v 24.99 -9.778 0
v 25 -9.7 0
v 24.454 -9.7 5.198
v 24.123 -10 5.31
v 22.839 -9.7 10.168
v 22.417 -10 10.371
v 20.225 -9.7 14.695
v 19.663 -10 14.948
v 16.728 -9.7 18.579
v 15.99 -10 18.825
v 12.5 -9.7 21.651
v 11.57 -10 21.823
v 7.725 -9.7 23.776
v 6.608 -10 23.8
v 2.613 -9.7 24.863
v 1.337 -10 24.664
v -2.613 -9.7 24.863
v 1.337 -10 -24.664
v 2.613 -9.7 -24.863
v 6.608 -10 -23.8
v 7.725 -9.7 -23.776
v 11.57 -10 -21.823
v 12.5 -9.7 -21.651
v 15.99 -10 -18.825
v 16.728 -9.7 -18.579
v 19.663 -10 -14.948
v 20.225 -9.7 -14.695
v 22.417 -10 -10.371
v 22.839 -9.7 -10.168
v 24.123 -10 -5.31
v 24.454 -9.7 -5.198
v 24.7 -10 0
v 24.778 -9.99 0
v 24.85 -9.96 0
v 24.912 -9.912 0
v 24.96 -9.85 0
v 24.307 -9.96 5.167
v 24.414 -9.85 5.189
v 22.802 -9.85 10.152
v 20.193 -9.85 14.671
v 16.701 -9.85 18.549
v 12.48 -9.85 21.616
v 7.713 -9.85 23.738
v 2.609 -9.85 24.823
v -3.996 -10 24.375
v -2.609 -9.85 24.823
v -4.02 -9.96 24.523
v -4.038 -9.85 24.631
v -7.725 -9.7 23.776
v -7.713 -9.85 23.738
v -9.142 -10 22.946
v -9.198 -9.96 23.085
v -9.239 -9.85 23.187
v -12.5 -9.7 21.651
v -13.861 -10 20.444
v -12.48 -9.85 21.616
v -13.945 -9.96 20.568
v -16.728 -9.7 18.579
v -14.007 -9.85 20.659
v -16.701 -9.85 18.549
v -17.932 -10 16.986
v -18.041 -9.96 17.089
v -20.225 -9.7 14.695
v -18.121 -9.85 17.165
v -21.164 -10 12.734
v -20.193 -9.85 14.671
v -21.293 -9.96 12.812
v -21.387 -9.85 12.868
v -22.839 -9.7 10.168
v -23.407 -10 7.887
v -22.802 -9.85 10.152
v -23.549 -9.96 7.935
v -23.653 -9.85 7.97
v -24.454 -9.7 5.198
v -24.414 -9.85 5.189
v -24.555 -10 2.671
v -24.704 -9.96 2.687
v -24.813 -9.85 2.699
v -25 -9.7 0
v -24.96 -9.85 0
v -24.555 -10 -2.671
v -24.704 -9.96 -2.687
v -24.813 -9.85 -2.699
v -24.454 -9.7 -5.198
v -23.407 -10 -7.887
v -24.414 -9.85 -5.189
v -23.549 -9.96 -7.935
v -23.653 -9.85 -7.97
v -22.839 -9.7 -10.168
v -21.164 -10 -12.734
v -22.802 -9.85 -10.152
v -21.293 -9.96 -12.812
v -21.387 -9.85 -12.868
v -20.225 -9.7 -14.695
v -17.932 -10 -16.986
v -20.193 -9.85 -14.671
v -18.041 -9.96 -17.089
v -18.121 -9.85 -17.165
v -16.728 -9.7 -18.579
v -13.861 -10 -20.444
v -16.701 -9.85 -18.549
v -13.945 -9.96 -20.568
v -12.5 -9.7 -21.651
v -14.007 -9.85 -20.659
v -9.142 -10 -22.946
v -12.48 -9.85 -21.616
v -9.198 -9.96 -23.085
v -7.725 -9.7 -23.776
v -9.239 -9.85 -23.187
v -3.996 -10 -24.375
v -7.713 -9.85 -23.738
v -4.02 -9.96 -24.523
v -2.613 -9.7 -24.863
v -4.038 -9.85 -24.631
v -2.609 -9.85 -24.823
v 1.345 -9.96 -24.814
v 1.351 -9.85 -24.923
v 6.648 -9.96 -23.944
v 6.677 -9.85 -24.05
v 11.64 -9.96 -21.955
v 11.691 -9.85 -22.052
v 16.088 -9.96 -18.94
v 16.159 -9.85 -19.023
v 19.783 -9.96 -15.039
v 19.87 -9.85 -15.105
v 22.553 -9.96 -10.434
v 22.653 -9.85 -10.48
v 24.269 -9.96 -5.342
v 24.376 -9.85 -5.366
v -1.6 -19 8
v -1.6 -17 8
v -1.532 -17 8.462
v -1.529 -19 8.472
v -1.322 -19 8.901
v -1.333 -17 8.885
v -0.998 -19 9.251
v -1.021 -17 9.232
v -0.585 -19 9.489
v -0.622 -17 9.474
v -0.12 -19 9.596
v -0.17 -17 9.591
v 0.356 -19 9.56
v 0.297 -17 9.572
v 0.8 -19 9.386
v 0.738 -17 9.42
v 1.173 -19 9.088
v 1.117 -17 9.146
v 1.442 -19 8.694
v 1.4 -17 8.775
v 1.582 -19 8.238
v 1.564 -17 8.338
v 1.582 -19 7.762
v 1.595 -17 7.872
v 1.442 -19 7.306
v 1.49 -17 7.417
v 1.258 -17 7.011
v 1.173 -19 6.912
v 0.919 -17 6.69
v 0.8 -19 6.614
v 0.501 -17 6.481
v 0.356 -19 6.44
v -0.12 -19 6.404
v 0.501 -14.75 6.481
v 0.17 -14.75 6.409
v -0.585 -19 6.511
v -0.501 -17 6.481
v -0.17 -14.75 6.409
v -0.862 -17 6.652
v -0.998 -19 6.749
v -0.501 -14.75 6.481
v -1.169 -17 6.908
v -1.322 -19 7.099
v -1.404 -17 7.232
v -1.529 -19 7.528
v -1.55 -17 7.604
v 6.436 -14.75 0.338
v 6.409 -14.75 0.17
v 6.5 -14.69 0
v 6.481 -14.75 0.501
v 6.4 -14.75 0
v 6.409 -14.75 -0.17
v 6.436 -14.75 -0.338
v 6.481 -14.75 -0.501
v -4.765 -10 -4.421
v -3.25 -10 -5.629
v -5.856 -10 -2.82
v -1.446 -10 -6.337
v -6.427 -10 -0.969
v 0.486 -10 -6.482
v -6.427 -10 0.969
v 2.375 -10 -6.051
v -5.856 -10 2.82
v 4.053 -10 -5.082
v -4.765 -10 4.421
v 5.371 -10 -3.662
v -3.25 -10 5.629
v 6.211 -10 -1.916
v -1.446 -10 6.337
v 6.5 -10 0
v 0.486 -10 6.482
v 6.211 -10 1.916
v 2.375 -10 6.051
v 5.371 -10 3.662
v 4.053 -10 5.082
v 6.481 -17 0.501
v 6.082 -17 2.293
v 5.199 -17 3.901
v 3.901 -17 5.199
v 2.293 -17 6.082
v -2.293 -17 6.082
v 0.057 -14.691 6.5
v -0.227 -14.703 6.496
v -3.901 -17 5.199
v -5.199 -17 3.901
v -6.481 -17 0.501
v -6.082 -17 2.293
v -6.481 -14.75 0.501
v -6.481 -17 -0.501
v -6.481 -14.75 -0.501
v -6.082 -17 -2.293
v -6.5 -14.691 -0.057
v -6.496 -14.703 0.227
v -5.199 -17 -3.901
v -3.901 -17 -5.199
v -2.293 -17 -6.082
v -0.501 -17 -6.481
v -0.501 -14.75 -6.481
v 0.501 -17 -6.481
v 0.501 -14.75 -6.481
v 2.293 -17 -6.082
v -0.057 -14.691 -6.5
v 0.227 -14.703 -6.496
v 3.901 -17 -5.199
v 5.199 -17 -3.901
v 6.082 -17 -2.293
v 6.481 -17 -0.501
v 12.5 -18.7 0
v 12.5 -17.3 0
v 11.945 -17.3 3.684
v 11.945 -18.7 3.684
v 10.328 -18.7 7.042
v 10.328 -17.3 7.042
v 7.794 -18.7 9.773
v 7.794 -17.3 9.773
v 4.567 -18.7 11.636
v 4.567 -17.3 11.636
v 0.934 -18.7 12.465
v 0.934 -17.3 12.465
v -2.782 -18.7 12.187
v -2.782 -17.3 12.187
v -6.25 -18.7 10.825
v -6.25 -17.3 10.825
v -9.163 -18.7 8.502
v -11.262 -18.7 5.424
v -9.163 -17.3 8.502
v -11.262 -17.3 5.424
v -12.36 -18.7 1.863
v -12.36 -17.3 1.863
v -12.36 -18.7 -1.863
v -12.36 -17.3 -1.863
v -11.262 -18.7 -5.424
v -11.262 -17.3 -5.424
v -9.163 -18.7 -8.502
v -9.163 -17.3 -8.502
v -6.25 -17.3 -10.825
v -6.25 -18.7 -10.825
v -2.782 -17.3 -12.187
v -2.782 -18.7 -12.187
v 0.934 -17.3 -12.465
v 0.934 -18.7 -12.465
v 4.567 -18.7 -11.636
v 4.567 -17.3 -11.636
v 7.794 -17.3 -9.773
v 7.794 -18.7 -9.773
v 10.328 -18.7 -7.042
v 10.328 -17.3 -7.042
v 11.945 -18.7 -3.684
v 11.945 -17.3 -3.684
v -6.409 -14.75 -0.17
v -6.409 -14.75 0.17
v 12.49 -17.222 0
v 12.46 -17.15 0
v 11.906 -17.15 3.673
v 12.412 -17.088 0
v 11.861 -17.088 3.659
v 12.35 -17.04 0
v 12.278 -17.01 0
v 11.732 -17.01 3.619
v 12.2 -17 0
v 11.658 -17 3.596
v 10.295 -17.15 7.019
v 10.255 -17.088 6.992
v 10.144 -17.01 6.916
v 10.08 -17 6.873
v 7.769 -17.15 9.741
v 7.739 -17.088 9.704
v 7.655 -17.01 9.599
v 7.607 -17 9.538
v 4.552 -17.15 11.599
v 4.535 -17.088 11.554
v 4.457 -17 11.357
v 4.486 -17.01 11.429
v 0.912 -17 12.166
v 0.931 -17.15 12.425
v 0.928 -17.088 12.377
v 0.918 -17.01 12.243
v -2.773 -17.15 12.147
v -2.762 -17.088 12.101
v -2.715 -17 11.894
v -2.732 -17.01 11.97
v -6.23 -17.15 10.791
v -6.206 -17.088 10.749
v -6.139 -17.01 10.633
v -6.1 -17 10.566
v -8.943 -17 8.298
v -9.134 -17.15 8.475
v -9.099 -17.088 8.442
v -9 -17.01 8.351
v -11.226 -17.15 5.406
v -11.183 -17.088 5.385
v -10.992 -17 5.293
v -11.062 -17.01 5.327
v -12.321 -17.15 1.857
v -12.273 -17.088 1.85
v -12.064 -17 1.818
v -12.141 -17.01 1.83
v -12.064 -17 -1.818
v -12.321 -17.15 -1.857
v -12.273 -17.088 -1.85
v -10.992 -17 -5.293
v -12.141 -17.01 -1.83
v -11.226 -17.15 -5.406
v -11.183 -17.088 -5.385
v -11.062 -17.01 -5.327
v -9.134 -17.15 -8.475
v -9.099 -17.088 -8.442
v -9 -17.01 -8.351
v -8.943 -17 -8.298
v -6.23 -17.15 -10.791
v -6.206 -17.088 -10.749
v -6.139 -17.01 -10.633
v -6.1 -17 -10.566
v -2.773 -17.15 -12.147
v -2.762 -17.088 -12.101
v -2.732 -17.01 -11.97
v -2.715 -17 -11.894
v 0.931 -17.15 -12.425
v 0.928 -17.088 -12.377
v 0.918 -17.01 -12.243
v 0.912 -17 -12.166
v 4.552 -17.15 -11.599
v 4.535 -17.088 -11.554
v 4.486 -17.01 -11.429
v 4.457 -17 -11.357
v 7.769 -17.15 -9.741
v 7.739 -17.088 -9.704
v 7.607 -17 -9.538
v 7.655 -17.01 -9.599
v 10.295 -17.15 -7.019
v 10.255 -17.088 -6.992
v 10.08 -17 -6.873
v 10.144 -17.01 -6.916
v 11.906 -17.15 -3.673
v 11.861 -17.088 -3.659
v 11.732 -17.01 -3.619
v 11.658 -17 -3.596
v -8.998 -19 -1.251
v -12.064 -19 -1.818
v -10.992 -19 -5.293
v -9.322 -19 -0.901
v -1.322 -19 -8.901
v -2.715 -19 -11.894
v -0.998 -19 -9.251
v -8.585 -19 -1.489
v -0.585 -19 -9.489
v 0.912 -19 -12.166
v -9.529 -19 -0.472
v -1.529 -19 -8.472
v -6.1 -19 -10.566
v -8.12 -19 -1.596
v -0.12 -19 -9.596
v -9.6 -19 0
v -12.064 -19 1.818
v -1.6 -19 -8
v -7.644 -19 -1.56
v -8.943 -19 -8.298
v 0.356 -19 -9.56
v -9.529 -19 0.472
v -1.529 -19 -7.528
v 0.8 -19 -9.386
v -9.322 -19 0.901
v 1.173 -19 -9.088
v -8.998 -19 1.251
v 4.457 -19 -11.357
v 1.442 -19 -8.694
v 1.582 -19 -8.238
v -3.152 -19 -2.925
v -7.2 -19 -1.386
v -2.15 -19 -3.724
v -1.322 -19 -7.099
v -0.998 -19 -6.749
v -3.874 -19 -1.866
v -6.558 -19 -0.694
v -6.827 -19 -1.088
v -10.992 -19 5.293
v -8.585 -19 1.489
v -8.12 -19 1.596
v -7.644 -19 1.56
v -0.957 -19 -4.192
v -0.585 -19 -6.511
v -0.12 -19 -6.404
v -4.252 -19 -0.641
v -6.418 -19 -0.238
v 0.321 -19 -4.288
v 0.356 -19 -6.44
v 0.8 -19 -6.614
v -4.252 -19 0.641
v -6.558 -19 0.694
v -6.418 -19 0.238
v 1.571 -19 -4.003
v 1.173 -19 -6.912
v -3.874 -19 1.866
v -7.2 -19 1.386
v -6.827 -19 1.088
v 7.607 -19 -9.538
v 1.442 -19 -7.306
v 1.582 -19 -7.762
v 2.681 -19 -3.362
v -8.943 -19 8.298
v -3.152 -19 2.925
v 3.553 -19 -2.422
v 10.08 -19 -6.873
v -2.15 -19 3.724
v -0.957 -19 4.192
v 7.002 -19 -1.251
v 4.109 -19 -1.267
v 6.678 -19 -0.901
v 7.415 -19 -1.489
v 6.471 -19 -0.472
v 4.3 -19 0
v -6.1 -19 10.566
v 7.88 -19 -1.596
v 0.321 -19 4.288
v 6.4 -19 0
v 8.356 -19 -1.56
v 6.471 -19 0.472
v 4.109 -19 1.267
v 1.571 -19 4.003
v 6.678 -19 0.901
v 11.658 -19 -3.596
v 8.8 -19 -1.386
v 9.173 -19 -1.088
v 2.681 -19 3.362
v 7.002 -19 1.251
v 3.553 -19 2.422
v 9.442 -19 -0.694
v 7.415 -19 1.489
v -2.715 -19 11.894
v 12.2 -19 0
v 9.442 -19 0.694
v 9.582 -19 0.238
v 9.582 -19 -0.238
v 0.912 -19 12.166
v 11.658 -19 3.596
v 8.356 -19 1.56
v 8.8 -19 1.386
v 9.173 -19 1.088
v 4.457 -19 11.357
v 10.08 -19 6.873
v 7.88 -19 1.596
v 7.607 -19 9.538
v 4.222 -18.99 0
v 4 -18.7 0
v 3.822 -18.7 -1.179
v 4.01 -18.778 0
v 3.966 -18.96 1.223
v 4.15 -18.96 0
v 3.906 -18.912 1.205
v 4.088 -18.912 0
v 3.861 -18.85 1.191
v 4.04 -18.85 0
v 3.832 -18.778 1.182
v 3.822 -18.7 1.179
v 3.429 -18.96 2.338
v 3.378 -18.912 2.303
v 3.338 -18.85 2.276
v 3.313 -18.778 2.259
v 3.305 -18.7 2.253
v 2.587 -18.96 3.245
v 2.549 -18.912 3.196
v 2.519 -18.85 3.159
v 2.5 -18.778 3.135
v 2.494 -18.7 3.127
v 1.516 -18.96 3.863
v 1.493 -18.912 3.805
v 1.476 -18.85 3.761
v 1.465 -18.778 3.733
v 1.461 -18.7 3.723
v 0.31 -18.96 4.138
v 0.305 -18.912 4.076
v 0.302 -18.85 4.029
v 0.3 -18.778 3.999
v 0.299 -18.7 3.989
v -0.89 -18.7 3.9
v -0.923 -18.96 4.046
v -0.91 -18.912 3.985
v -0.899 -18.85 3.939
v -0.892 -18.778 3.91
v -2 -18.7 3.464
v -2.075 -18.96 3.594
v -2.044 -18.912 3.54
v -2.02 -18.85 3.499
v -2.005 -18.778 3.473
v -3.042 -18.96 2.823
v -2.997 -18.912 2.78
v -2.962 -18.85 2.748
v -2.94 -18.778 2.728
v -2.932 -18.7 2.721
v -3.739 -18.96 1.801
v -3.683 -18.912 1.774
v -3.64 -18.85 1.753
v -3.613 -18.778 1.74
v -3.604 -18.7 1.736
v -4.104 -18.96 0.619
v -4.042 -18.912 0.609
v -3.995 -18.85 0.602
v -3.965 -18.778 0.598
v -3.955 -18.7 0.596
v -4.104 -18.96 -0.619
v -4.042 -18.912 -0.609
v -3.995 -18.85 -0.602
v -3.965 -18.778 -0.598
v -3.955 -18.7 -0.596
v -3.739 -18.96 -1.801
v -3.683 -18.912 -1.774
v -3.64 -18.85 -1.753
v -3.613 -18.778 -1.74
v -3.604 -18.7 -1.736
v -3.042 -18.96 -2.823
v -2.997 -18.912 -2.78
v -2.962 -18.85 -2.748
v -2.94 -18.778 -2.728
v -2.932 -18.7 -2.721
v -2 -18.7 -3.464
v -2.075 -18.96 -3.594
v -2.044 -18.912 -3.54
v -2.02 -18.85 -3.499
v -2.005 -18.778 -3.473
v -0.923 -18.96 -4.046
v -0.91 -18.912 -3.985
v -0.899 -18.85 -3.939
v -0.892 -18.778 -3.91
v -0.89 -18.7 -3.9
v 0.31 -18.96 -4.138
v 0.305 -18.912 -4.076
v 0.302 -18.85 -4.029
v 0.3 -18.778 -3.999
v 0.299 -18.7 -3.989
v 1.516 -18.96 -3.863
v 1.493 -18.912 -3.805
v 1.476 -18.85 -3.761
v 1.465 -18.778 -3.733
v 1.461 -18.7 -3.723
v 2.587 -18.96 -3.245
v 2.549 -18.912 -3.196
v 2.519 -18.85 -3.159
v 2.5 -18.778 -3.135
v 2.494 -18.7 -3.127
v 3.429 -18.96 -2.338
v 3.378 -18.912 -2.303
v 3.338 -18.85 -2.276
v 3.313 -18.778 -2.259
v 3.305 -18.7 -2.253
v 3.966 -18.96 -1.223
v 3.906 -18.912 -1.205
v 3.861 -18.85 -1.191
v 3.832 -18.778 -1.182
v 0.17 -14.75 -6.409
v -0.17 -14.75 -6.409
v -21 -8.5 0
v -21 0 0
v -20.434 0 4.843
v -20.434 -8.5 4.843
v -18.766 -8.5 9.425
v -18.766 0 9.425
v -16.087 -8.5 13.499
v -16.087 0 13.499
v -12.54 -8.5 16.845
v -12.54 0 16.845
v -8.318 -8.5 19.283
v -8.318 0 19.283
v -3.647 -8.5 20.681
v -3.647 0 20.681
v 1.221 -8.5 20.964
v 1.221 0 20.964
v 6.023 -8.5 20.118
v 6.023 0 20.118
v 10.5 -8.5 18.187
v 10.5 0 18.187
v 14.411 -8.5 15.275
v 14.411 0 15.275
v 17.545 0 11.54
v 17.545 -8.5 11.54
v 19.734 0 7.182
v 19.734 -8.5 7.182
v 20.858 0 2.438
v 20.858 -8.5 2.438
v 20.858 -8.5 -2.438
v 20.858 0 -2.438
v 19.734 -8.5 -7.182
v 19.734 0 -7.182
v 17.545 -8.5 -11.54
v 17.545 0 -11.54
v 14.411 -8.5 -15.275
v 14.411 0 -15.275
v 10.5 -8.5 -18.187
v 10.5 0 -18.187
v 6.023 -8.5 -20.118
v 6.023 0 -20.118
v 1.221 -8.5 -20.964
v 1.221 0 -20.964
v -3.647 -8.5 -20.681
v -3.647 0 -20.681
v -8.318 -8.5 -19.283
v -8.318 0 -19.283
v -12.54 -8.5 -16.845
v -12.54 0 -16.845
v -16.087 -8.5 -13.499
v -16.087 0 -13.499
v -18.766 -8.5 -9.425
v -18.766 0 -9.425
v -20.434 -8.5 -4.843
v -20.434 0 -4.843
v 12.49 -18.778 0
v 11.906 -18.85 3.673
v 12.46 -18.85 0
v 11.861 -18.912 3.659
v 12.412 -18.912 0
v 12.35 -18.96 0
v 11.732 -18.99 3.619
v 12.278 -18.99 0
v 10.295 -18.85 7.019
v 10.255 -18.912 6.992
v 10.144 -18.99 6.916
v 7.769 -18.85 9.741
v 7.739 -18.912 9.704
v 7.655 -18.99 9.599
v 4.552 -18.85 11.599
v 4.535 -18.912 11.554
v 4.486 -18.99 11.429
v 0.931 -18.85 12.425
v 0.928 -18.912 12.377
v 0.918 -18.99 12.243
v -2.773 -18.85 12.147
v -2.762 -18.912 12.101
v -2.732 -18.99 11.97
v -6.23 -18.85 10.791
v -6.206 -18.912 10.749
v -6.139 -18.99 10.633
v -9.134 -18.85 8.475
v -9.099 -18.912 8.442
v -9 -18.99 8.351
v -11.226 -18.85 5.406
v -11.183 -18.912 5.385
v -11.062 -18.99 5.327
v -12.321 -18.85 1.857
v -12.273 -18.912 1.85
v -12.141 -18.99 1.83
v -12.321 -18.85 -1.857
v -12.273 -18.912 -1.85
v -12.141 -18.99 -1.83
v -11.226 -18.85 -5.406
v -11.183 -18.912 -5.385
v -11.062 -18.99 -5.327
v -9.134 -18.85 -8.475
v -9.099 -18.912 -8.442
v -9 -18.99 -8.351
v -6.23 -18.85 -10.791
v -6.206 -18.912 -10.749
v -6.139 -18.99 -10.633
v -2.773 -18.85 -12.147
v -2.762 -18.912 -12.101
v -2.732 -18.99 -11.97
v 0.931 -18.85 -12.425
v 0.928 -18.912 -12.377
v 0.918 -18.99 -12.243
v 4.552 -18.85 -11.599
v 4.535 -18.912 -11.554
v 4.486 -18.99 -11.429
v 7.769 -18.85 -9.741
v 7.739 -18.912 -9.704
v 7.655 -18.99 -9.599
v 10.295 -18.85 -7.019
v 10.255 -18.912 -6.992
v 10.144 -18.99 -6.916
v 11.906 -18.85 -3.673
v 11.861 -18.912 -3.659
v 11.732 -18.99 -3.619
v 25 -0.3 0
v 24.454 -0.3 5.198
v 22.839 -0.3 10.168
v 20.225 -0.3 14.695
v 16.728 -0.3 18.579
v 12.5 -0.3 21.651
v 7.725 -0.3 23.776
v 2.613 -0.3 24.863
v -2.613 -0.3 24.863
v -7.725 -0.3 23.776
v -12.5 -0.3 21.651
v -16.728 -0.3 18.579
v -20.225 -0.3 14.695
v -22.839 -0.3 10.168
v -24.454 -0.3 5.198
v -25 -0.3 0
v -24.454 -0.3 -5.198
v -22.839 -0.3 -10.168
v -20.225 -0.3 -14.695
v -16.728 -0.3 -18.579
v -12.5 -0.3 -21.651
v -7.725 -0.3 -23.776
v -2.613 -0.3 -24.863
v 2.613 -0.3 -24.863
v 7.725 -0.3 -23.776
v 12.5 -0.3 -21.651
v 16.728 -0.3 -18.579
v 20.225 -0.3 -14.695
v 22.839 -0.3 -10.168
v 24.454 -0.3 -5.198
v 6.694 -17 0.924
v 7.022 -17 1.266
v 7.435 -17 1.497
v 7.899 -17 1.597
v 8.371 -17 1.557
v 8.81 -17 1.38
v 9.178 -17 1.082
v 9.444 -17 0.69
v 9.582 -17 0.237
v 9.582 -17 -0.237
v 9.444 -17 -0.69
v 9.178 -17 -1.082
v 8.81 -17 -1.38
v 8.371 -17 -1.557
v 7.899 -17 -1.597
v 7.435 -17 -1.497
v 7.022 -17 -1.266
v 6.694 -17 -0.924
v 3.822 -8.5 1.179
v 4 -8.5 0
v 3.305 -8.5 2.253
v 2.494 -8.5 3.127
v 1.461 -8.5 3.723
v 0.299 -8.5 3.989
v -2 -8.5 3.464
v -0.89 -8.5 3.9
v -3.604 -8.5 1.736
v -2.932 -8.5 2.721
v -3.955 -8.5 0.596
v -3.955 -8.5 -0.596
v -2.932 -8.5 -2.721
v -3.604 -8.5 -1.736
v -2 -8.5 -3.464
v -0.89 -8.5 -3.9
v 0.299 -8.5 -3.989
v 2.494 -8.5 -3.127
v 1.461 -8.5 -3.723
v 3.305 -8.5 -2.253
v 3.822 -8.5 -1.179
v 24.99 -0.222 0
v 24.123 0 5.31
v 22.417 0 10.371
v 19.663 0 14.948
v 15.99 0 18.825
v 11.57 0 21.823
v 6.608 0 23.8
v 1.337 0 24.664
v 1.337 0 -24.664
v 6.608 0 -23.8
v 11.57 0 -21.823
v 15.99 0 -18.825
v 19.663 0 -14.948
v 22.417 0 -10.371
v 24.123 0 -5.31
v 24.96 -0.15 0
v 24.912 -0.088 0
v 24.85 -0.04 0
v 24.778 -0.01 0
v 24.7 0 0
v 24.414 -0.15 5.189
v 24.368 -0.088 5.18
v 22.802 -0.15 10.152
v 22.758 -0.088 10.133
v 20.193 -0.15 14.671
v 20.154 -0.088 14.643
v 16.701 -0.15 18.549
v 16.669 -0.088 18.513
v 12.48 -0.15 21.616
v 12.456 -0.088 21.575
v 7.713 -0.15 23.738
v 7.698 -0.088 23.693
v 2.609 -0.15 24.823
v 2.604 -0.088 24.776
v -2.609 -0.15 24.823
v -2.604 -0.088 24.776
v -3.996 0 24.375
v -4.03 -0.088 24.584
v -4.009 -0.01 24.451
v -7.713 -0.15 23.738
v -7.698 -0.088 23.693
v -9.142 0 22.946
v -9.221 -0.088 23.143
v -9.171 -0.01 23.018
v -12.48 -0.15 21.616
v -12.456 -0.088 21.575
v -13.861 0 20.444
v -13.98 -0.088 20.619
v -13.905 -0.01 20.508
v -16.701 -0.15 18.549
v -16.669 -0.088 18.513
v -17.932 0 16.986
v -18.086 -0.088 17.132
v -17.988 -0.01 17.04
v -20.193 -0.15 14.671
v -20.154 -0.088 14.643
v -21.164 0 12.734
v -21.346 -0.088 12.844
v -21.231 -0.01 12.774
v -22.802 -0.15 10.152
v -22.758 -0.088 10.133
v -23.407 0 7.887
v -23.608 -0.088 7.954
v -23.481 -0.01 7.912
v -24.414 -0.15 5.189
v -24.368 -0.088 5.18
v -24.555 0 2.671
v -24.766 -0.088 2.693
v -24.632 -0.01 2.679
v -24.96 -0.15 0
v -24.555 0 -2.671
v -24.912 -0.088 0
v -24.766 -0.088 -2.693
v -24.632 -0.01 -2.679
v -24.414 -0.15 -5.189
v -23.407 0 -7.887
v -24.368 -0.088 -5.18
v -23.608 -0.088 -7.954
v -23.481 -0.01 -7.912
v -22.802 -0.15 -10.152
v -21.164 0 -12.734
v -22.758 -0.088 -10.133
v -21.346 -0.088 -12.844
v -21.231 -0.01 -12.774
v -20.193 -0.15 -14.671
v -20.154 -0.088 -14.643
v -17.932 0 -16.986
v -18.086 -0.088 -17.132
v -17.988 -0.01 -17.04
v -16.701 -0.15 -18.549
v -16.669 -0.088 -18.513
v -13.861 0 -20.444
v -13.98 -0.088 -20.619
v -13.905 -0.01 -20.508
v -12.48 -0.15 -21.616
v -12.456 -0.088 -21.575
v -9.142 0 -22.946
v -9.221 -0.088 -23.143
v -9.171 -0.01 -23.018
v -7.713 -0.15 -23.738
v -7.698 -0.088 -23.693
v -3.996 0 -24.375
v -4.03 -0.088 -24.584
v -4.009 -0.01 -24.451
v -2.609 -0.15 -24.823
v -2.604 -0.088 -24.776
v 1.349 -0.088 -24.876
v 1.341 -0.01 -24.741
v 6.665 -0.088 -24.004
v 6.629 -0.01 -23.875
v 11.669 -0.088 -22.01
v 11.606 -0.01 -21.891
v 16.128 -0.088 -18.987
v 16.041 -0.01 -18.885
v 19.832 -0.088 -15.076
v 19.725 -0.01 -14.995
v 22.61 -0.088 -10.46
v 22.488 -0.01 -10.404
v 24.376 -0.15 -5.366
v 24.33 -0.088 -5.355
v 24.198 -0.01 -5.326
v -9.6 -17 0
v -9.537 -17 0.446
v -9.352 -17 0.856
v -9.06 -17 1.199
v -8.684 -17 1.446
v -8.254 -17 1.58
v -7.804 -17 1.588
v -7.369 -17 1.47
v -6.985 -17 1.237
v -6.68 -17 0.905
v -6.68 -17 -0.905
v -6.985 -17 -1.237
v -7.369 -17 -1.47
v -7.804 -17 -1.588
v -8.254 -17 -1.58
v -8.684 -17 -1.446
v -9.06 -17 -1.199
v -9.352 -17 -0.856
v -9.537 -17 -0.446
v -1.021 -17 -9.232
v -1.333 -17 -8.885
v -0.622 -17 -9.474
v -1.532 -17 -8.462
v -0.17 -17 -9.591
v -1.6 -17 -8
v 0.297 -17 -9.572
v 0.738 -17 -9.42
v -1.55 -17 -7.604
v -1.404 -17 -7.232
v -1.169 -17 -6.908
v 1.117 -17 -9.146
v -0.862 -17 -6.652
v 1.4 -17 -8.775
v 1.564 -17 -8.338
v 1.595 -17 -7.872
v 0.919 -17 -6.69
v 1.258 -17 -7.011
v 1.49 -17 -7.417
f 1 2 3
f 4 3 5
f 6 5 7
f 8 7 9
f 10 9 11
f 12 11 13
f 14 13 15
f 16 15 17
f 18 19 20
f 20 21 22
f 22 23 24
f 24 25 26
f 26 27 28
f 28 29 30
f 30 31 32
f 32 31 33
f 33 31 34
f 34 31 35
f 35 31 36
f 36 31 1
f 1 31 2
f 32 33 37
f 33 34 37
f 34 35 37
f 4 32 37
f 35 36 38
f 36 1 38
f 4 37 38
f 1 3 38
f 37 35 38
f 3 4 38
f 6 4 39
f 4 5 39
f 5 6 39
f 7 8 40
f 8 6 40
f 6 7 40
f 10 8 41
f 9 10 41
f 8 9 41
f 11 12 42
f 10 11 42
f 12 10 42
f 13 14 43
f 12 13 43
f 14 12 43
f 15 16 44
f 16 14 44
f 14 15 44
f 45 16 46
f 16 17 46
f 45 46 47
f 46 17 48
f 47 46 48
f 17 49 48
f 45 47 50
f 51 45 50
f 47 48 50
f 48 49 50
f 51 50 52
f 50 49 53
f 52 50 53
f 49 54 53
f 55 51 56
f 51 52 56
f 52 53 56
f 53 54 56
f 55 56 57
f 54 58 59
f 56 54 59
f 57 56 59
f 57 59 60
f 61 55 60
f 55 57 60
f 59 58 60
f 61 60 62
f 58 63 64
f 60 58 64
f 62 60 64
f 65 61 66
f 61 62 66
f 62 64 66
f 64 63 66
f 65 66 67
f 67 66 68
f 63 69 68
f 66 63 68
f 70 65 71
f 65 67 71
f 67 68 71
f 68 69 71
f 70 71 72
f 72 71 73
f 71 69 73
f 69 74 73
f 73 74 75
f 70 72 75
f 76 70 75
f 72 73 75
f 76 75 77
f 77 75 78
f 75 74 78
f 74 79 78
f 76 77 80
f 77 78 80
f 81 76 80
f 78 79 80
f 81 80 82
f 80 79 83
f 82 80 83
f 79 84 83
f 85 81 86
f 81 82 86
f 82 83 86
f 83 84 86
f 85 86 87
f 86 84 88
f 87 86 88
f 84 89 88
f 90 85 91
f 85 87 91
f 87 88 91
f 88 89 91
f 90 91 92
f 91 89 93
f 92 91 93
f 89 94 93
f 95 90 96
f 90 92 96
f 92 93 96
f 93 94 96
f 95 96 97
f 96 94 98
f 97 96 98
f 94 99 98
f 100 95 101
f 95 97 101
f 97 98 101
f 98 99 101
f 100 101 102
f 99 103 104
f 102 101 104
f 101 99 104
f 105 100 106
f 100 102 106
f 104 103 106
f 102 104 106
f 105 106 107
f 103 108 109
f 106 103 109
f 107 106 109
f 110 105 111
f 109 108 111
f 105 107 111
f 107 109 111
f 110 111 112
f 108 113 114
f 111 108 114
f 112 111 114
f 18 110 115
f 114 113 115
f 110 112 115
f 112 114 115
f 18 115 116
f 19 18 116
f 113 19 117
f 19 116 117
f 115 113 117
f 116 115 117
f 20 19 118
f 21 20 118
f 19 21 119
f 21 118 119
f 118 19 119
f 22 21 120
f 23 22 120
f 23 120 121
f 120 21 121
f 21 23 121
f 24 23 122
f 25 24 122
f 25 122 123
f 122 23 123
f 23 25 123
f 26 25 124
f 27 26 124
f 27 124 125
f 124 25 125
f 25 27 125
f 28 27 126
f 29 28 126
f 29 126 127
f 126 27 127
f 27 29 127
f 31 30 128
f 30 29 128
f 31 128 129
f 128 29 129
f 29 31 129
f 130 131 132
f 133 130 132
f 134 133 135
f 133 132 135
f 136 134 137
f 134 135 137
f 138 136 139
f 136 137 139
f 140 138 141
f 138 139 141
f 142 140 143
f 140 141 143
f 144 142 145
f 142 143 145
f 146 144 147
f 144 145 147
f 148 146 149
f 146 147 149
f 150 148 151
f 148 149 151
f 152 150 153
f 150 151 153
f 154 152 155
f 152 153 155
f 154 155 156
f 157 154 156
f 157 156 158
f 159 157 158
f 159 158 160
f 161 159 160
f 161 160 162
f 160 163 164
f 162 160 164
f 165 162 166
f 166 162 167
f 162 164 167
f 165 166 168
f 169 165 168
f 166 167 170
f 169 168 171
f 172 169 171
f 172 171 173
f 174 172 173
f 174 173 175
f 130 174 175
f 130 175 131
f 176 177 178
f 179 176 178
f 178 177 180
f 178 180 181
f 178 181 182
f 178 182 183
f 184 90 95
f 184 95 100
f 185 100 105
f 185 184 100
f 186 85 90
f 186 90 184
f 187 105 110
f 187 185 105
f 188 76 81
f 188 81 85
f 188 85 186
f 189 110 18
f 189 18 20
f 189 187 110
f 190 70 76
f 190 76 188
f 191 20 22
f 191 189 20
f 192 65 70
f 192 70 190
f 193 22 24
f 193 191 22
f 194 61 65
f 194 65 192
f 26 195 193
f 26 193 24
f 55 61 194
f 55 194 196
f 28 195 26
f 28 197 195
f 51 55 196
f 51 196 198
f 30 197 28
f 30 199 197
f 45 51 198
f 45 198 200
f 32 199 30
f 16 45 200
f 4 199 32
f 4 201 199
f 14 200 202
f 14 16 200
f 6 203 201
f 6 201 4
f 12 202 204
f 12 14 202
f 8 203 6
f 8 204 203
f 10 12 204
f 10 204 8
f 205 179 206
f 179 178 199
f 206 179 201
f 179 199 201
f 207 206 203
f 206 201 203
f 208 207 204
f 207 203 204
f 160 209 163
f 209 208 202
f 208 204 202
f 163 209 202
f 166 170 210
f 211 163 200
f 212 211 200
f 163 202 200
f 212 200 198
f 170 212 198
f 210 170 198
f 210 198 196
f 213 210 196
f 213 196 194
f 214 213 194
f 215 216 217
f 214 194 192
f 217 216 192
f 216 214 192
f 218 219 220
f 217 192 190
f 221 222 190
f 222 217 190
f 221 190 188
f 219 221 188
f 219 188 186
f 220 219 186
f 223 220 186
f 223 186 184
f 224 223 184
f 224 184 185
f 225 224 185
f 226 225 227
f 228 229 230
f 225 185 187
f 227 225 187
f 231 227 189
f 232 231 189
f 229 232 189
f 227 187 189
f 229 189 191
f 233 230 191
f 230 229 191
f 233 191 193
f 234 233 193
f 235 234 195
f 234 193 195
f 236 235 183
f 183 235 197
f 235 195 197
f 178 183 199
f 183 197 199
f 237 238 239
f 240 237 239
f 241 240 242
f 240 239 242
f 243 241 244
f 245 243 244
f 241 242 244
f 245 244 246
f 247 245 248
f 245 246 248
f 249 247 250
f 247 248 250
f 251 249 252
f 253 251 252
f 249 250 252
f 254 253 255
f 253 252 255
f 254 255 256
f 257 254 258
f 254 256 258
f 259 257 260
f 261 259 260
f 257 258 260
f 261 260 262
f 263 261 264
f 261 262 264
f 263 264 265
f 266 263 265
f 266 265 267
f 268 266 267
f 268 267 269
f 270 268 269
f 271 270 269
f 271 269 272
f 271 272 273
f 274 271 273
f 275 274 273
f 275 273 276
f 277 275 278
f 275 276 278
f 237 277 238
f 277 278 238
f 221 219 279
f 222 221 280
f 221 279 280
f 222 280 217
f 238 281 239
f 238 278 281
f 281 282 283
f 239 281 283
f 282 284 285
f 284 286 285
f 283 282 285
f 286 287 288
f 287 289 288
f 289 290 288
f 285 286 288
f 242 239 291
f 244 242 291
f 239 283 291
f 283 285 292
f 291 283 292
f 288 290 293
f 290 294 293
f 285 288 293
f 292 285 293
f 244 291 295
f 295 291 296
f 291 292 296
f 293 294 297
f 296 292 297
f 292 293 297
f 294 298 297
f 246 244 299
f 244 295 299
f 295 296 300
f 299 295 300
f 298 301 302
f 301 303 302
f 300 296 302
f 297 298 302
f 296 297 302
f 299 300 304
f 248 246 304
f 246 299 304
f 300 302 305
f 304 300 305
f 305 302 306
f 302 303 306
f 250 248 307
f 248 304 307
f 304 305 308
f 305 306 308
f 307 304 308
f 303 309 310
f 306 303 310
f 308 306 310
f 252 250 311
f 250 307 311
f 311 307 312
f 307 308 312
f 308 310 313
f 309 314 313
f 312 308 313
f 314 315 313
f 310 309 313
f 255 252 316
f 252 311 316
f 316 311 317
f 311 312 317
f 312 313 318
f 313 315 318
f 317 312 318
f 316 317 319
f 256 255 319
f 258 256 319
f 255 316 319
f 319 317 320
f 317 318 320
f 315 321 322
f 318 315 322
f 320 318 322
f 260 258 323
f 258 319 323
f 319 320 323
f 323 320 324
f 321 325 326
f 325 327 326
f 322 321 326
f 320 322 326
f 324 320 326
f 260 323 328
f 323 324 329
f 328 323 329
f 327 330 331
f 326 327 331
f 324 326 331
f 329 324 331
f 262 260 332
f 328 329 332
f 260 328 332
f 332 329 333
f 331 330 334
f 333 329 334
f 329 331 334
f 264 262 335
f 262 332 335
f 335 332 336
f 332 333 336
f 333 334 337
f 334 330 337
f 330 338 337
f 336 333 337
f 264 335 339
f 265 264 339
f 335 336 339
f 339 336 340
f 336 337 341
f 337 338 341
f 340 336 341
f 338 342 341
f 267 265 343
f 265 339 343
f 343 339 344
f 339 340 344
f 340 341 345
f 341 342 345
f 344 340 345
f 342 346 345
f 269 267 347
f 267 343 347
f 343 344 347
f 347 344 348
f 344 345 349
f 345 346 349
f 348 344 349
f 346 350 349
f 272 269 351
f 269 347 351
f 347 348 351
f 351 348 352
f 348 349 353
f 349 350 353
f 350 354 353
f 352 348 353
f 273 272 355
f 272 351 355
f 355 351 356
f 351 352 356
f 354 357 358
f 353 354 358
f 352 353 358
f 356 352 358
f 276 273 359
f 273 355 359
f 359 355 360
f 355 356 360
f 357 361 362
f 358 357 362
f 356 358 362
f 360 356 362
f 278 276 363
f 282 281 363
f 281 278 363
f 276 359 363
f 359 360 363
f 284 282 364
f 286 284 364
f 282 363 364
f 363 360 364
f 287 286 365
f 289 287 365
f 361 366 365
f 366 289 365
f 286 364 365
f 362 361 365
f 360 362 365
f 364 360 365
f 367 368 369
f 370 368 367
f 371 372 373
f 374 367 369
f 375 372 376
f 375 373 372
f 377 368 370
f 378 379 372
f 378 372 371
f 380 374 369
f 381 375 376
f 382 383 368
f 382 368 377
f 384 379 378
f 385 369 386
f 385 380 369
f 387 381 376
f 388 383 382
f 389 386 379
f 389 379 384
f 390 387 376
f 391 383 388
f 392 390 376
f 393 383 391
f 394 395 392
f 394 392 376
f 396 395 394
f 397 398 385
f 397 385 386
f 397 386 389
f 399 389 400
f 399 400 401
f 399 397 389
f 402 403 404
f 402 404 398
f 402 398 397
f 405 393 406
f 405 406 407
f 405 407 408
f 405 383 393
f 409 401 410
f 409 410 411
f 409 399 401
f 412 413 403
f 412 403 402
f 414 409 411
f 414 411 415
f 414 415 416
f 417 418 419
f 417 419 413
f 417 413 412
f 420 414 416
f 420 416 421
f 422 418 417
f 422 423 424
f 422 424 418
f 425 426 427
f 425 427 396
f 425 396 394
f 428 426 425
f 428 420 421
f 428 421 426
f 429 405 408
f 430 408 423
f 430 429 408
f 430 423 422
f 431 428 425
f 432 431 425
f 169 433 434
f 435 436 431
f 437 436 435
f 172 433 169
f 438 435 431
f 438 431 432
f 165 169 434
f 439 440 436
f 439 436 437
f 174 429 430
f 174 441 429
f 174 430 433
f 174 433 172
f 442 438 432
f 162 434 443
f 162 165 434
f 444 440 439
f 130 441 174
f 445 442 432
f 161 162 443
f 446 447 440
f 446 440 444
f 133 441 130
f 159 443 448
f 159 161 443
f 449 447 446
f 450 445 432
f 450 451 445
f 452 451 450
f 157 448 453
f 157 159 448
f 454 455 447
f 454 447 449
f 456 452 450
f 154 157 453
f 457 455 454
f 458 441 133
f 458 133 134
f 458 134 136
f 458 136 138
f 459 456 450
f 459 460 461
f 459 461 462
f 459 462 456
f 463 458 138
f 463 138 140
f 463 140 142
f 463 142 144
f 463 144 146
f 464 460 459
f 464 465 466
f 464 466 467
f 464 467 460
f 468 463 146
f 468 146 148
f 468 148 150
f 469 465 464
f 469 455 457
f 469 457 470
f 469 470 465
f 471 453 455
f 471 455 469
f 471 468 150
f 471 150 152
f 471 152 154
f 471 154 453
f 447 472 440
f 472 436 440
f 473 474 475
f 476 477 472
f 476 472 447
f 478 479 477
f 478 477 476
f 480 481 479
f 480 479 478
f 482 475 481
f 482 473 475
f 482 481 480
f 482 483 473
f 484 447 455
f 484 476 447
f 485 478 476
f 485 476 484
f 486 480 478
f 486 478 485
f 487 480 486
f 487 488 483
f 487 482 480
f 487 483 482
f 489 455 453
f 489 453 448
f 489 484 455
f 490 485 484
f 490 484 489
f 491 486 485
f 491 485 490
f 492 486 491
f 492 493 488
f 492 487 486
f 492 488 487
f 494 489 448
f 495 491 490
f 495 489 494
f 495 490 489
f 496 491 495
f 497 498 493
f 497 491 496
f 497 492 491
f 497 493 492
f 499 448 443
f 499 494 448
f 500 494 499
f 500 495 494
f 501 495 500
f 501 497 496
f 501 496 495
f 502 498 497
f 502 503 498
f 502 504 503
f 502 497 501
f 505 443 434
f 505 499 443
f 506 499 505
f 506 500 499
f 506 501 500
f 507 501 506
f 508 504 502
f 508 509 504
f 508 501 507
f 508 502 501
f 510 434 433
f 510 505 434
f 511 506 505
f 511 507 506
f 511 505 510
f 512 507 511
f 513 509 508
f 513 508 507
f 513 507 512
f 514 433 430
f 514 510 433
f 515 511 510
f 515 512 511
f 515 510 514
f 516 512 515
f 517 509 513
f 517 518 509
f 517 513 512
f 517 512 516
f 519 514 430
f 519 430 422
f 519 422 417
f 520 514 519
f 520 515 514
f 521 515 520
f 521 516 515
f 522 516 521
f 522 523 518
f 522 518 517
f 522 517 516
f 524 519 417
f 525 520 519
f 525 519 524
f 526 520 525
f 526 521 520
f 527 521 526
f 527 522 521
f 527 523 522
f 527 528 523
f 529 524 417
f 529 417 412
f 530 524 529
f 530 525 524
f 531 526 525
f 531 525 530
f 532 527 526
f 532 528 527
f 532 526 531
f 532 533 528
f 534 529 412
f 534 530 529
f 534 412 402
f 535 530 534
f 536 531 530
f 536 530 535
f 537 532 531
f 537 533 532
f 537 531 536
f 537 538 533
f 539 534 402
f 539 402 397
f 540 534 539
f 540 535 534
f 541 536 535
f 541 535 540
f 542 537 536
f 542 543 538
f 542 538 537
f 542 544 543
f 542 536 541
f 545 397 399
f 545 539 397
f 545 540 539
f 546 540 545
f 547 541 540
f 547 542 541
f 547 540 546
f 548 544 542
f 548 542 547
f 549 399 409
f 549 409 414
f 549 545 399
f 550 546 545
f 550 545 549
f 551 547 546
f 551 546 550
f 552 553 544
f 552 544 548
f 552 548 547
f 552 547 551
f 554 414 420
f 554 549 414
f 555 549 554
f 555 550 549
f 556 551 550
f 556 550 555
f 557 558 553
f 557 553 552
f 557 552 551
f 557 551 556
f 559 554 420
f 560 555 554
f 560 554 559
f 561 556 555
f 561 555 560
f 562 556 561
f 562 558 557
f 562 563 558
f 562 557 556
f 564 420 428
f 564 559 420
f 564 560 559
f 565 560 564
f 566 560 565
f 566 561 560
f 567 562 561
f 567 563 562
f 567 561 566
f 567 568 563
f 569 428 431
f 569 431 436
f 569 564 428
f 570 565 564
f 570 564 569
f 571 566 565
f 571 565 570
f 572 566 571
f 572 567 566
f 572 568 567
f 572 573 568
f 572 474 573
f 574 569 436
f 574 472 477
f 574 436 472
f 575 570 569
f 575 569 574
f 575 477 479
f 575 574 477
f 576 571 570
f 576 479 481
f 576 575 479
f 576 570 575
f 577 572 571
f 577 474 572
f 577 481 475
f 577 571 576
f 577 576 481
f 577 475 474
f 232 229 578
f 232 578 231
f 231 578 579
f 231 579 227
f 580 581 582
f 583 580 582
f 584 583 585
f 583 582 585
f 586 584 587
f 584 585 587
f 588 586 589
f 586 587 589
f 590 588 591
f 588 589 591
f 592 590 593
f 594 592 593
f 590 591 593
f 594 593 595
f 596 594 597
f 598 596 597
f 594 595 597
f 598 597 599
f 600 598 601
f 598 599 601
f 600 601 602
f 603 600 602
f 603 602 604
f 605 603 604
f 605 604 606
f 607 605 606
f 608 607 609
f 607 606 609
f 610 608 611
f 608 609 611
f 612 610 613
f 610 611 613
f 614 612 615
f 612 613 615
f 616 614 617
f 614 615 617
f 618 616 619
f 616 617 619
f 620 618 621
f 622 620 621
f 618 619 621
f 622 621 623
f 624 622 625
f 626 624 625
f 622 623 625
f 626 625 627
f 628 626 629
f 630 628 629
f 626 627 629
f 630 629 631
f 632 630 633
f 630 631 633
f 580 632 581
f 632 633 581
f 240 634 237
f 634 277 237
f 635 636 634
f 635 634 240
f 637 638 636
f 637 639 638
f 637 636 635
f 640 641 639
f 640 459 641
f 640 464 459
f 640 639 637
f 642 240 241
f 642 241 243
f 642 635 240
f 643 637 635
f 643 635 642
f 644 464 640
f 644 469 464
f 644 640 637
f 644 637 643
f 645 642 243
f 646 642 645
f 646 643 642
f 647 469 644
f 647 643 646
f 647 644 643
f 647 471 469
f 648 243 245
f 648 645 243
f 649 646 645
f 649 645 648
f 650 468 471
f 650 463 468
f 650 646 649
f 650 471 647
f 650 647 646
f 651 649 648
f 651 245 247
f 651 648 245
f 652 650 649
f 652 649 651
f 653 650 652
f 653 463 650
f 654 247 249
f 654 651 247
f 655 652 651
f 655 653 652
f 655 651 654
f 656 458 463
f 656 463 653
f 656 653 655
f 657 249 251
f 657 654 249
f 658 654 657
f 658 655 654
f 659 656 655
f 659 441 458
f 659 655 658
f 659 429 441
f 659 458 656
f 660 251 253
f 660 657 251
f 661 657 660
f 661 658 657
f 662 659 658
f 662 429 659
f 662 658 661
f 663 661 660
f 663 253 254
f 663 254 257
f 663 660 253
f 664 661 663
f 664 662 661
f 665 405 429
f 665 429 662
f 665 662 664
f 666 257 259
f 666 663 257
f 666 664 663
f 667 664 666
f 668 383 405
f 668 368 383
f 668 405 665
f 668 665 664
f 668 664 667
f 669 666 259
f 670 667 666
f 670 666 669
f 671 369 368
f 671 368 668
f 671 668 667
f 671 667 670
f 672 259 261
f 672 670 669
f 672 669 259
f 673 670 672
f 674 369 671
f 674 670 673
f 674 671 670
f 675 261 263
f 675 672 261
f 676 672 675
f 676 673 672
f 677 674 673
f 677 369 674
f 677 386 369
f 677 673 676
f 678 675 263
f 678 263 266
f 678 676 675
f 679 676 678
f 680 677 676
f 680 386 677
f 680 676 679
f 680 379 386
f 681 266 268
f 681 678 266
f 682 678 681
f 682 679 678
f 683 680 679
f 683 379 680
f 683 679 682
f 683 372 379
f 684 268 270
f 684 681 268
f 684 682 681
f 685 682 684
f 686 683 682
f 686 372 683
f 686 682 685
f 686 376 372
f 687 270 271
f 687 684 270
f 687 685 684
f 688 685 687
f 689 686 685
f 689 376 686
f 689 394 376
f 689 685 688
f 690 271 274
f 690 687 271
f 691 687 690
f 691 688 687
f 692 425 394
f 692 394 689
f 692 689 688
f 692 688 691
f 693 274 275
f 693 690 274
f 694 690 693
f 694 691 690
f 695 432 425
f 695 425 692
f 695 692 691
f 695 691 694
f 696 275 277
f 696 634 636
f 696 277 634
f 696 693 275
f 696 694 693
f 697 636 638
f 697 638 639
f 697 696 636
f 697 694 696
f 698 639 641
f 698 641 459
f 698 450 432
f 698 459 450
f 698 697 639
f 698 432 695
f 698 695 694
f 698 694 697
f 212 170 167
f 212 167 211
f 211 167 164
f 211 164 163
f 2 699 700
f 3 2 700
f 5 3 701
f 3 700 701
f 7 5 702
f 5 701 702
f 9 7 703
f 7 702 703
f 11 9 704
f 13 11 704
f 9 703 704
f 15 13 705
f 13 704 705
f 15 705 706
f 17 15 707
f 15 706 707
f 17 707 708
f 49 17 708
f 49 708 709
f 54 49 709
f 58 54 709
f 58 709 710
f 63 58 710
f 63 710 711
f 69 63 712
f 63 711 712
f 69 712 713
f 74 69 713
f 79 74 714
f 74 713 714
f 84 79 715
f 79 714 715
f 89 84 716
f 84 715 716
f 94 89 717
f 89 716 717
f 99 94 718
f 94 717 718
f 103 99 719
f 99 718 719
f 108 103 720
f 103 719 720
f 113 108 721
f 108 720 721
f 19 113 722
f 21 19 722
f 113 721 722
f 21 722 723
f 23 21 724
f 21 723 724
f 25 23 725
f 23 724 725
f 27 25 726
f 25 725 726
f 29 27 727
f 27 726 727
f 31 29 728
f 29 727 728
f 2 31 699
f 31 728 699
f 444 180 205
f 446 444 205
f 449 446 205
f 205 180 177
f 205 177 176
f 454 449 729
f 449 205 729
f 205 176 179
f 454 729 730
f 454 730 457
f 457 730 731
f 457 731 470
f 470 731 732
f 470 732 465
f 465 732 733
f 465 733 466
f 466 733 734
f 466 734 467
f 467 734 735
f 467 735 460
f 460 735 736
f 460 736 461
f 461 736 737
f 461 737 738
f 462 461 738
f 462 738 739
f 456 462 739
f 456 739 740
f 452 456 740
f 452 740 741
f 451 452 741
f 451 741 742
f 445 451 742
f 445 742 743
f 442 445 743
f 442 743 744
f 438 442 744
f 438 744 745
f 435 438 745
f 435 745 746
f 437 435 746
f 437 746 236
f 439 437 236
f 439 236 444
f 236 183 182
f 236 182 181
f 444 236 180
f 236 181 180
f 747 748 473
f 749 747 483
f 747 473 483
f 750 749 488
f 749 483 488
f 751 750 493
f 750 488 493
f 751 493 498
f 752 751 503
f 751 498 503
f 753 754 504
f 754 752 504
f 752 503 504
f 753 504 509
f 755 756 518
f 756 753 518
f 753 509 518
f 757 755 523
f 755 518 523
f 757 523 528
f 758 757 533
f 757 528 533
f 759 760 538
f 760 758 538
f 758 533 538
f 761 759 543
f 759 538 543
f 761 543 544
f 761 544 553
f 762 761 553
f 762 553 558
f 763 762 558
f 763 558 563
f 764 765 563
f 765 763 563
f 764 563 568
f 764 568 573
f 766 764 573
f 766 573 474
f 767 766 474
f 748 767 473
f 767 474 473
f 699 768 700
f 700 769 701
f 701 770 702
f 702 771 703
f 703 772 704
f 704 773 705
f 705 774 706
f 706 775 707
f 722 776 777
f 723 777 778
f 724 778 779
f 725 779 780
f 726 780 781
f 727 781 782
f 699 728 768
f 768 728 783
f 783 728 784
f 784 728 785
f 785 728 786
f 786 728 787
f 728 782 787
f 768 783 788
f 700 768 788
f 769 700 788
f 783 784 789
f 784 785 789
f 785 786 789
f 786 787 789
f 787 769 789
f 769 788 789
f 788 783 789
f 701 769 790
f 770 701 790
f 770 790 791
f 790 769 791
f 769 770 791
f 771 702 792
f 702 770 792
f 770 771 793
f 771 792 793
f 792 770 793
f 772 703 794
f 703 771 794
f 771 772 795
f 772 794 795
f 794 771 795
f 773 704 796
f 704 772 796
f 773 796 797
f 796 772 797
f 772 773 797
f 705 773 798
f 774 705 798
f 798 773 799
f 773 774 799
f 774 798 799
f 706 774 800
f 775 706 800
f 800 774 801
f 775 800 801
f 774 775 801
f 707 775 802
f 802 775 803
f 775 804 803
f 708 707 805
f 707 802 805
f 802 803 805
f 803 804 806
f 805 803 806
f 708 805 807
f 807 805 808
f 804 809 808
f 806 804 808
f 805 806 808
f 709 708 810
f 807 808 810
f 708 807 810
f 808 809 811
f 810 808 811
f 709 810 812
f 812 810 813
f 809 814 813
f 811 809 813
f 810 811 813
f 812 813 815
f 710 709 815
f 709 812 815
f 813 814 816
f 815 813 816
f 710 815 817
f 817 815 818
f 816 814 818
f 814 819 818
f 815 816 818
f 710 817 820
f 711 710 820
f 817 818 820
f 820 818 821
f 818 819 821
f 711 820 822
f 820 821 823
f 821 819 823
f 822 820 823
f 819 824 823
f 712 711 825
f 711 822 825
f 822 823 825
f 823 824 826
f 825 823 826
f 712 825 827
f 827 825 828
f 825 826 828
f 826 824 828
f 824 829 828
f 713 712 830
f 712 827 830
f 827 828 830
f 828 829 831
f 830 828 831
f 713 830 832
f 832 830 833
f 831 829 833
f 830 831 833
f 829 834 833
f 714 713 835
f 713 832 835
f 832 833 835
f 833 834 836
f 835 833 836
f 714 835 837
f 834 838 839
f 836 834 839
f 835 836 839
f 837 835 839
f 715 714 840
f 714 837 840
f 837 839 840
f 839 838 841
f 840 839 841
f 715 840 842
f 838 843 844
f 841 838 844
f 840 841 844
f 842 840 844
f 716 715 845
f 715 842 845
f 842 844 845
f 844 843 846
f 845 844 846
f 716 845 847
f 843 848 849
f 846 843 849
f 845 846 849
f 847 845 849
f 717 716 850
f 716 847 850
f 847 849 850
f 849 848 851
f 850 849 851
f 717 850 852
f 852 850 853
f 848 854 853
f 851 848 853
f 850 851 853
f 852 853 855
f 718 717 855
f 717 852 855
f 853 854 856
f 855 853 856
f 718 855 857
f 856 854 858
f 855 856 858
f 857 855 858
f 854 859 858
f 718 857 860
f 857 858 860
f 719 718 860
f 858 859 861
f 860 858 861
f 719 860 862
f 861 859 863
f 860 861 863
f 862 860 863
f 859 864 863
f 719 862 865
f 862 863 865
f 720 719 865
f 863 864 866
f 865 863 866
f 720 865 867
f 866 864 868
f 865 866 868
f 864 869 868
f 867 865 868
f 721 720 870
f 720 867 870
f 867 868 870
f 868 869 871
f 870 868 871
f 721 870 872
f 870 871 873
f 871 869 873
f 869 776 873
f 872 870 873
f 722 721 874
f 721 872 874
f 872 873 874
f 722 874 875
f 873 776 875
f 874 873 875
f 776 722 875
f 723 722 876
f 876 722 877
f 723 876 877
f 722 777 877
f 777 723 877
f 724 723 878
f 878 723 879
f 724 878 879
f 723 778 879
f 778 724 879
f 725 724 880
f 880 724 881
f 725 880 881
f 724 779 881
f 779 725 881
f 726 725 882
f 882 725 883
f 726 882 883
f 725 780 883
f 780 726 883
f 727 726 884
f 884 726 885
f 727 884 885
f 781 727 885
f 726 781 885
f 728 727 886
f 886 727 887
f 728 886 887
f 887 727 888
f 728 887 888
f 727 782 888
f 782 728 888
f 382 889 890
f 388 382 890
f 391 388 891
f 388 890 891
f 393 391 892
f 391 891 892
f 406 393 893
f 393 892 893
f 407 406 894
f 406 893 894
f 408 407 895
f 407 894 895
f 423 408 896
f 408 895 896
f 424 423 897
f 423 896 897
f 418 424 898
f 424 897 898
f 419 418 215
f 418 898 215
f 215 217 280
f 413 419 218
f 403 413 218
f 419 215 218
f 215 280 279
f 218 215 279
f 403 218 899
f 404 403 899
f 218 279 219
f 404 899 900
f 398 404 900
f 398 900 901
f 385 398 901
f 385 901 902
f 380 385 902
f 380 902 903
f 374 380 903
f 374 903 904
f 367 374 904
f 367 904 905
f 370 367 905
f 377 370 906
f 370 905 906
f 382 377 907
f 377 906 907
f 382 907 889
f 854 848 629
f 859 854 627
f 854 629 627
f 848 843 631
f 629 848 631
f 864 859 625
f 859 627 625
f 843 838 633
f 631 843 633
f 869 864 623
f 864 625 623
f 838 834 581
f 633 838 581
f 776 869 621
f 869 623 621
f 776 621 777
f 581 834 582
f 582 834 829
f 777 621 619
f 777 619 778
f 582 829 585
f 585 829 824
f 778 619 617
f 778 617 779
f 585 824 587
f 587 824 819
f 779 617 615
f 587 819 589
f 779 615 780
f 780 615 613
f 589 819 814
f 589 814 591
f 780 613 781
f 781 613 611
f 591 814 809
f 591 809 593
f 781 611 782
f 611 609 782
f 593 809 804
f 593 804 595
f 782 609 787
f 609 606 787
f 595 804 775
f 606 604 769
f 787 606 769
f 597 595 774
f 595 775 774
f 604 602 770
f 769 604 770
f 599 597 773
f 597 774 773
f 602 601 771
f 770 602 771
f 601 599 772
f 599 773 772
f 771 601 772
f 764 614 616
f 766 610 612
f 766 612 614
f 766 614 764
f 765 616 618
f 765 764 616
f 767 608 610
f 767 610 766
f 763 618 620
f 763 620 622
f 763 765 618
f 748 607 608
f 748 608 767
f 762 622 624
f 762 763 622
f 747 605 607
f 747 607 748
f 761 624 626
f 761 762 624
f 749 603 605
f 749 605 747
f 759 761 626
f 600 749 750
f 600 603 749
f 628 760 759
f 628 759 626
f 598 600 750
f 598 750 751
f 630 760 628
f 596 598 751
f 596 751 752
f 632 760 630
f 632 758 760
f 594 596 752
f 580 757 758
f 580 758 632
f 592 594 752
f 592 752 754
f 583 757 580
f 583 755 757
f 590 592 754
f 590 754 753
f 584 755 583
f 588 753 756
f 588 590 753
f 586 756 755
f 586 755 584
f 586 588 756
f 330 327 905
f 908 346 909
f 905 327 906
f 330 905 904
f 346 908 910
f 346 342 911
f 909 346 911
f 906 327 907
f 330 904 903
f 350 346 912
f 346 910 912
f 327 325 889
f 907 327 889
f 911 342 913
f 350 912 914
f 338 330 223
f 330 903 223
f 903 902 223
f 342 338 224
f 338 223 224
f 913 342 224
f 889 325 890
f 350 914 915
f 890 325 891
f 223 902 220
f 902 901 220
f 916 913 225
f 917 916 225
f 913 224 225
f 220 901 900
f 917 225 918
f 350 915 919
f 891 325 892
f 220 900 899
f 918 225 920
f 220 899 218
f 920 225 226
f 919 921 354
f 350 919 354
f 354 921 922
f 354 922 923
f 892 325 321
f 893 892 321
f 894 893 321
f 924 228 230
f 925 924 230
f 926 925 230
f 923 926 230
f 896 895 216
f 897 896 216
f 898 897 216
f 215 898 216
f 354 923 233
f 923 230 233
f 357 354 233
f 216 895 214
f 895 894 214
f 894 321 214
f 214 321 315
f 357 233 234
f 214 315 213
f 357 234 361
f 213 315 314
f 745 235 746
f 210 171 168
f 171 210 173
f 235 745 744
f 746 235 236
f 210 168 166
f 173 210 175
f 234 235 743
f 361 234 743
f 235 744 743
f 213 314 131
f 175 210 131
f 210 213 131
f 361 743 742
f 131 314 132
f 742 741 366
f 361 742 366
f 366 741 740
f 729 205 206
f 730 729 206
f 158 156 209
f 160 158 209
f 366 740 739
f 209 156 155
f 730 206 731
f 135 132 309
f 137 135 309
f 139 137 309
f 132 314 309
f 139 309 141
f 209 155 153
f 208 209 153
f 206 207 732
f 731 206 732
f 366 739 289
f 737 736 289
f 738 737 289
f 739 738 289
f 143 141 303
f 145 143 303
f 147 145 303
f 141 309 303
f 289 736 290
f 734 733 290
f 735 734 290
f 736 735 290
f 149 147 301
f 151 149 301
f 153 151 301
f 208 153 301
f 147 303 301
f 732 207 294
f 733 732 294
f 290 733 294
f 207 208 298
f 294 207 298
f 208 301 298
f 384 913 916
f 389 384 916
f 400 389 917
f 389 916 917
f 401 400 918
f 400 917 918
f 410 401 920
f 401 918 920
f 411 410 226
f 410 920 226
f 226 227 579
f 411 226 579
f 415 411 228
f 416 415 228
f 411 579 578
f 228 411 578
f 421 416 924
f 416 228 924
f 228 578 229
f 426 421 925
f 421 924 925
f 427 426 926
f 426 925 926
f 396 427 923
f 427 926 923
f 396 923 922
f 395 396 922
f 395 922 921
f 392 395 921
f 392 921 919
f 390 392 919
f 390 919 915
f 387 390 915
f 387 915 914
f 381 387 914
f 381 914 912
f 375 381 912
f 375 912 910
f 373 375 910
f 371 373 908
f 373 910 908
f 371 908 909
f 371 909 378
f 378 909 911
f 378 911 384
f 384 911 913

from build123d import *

# Parameters (mm, degrees)
F0_R      = 25
F1_DEPTH  = 10
F2_R      = 6.5
F3_DEPTH  = 7
F4_R      = 12.5
F5_DEPTH  = 2
F6_R      = 4
F7_DEPTH  = 19.001
F9_D      = 3.2
F9_DEPTH  = 4.25
F9_TIP    = 0.9613769904
F10_R     = 0.3
F11_R     = 21
F11_R_2   = 4
F12_DEPTH = 8.5


with BuildPart() as f1:
    # F0 (on Front) → F1 (new body)
    with BuildSketch(Plane.XZ):
        Circle(F0_R)
    extrude(amount=F1_DEPTH)

    # F2 (on face) → F3 (join)
    with BuildSketch(Plane.XZ.offset(10)):
        Circle(F2_R)
    extrude(amount=F3_DEPTH)

    # F4 (on face) → F5 (join)
    with BuildSketch(Plane.XZ.offset(17)):
        Circle(F4_R)
    extrude(amount=F5_DEPTH)

    # F6 (on face) → F7 (cut, through all)
    with BuildSketch(Plane.XZ.offset(19)):
        Circle(F6_R)
    extrude(amount=-F7_DEPTH, mode=Mode.SUBTRACT)

    # F9
    with Locations(Plane.XZ.offset(19)):
        with Locations((-8, 0), (0, 8), (8, 0), (0, -8)):
            Hole(F9_D / 2, depth=F9_DEPTH)
            with Locations((0, 0, -(F9_DEPTH + F9_TIP / 2))):  # 118° drill point
                Cone(0, F9_D / 2, F9_TIP, mode=Mode.SUBTRACT)

    # F10
    f10_edges = [f1.edges().sort_by_distance(p)[0] for p in [
        (-25, -10, 0),
        (-25, 0, 0),
        (-12.5, -19, 0),
        (-12.5, -17, 0),
        (-4, -19, 0),
    ]]
    fillet(f10_edges, radius=F10_R)

    # F11 (on face) → F12 (cut)
    with BuildSketch(Plane(origin=(0, 0, 0), x_dir=(-1, 0, 0), z_dir=(0, 1, 0))):
        Circle(F11_R)
        Circle(F11_R_2, mode=Mode.SUBTRACT)
    extrude(amount=-F12_DEPTH, mode=Mode.SUBTRACT)


solid = f1.part
